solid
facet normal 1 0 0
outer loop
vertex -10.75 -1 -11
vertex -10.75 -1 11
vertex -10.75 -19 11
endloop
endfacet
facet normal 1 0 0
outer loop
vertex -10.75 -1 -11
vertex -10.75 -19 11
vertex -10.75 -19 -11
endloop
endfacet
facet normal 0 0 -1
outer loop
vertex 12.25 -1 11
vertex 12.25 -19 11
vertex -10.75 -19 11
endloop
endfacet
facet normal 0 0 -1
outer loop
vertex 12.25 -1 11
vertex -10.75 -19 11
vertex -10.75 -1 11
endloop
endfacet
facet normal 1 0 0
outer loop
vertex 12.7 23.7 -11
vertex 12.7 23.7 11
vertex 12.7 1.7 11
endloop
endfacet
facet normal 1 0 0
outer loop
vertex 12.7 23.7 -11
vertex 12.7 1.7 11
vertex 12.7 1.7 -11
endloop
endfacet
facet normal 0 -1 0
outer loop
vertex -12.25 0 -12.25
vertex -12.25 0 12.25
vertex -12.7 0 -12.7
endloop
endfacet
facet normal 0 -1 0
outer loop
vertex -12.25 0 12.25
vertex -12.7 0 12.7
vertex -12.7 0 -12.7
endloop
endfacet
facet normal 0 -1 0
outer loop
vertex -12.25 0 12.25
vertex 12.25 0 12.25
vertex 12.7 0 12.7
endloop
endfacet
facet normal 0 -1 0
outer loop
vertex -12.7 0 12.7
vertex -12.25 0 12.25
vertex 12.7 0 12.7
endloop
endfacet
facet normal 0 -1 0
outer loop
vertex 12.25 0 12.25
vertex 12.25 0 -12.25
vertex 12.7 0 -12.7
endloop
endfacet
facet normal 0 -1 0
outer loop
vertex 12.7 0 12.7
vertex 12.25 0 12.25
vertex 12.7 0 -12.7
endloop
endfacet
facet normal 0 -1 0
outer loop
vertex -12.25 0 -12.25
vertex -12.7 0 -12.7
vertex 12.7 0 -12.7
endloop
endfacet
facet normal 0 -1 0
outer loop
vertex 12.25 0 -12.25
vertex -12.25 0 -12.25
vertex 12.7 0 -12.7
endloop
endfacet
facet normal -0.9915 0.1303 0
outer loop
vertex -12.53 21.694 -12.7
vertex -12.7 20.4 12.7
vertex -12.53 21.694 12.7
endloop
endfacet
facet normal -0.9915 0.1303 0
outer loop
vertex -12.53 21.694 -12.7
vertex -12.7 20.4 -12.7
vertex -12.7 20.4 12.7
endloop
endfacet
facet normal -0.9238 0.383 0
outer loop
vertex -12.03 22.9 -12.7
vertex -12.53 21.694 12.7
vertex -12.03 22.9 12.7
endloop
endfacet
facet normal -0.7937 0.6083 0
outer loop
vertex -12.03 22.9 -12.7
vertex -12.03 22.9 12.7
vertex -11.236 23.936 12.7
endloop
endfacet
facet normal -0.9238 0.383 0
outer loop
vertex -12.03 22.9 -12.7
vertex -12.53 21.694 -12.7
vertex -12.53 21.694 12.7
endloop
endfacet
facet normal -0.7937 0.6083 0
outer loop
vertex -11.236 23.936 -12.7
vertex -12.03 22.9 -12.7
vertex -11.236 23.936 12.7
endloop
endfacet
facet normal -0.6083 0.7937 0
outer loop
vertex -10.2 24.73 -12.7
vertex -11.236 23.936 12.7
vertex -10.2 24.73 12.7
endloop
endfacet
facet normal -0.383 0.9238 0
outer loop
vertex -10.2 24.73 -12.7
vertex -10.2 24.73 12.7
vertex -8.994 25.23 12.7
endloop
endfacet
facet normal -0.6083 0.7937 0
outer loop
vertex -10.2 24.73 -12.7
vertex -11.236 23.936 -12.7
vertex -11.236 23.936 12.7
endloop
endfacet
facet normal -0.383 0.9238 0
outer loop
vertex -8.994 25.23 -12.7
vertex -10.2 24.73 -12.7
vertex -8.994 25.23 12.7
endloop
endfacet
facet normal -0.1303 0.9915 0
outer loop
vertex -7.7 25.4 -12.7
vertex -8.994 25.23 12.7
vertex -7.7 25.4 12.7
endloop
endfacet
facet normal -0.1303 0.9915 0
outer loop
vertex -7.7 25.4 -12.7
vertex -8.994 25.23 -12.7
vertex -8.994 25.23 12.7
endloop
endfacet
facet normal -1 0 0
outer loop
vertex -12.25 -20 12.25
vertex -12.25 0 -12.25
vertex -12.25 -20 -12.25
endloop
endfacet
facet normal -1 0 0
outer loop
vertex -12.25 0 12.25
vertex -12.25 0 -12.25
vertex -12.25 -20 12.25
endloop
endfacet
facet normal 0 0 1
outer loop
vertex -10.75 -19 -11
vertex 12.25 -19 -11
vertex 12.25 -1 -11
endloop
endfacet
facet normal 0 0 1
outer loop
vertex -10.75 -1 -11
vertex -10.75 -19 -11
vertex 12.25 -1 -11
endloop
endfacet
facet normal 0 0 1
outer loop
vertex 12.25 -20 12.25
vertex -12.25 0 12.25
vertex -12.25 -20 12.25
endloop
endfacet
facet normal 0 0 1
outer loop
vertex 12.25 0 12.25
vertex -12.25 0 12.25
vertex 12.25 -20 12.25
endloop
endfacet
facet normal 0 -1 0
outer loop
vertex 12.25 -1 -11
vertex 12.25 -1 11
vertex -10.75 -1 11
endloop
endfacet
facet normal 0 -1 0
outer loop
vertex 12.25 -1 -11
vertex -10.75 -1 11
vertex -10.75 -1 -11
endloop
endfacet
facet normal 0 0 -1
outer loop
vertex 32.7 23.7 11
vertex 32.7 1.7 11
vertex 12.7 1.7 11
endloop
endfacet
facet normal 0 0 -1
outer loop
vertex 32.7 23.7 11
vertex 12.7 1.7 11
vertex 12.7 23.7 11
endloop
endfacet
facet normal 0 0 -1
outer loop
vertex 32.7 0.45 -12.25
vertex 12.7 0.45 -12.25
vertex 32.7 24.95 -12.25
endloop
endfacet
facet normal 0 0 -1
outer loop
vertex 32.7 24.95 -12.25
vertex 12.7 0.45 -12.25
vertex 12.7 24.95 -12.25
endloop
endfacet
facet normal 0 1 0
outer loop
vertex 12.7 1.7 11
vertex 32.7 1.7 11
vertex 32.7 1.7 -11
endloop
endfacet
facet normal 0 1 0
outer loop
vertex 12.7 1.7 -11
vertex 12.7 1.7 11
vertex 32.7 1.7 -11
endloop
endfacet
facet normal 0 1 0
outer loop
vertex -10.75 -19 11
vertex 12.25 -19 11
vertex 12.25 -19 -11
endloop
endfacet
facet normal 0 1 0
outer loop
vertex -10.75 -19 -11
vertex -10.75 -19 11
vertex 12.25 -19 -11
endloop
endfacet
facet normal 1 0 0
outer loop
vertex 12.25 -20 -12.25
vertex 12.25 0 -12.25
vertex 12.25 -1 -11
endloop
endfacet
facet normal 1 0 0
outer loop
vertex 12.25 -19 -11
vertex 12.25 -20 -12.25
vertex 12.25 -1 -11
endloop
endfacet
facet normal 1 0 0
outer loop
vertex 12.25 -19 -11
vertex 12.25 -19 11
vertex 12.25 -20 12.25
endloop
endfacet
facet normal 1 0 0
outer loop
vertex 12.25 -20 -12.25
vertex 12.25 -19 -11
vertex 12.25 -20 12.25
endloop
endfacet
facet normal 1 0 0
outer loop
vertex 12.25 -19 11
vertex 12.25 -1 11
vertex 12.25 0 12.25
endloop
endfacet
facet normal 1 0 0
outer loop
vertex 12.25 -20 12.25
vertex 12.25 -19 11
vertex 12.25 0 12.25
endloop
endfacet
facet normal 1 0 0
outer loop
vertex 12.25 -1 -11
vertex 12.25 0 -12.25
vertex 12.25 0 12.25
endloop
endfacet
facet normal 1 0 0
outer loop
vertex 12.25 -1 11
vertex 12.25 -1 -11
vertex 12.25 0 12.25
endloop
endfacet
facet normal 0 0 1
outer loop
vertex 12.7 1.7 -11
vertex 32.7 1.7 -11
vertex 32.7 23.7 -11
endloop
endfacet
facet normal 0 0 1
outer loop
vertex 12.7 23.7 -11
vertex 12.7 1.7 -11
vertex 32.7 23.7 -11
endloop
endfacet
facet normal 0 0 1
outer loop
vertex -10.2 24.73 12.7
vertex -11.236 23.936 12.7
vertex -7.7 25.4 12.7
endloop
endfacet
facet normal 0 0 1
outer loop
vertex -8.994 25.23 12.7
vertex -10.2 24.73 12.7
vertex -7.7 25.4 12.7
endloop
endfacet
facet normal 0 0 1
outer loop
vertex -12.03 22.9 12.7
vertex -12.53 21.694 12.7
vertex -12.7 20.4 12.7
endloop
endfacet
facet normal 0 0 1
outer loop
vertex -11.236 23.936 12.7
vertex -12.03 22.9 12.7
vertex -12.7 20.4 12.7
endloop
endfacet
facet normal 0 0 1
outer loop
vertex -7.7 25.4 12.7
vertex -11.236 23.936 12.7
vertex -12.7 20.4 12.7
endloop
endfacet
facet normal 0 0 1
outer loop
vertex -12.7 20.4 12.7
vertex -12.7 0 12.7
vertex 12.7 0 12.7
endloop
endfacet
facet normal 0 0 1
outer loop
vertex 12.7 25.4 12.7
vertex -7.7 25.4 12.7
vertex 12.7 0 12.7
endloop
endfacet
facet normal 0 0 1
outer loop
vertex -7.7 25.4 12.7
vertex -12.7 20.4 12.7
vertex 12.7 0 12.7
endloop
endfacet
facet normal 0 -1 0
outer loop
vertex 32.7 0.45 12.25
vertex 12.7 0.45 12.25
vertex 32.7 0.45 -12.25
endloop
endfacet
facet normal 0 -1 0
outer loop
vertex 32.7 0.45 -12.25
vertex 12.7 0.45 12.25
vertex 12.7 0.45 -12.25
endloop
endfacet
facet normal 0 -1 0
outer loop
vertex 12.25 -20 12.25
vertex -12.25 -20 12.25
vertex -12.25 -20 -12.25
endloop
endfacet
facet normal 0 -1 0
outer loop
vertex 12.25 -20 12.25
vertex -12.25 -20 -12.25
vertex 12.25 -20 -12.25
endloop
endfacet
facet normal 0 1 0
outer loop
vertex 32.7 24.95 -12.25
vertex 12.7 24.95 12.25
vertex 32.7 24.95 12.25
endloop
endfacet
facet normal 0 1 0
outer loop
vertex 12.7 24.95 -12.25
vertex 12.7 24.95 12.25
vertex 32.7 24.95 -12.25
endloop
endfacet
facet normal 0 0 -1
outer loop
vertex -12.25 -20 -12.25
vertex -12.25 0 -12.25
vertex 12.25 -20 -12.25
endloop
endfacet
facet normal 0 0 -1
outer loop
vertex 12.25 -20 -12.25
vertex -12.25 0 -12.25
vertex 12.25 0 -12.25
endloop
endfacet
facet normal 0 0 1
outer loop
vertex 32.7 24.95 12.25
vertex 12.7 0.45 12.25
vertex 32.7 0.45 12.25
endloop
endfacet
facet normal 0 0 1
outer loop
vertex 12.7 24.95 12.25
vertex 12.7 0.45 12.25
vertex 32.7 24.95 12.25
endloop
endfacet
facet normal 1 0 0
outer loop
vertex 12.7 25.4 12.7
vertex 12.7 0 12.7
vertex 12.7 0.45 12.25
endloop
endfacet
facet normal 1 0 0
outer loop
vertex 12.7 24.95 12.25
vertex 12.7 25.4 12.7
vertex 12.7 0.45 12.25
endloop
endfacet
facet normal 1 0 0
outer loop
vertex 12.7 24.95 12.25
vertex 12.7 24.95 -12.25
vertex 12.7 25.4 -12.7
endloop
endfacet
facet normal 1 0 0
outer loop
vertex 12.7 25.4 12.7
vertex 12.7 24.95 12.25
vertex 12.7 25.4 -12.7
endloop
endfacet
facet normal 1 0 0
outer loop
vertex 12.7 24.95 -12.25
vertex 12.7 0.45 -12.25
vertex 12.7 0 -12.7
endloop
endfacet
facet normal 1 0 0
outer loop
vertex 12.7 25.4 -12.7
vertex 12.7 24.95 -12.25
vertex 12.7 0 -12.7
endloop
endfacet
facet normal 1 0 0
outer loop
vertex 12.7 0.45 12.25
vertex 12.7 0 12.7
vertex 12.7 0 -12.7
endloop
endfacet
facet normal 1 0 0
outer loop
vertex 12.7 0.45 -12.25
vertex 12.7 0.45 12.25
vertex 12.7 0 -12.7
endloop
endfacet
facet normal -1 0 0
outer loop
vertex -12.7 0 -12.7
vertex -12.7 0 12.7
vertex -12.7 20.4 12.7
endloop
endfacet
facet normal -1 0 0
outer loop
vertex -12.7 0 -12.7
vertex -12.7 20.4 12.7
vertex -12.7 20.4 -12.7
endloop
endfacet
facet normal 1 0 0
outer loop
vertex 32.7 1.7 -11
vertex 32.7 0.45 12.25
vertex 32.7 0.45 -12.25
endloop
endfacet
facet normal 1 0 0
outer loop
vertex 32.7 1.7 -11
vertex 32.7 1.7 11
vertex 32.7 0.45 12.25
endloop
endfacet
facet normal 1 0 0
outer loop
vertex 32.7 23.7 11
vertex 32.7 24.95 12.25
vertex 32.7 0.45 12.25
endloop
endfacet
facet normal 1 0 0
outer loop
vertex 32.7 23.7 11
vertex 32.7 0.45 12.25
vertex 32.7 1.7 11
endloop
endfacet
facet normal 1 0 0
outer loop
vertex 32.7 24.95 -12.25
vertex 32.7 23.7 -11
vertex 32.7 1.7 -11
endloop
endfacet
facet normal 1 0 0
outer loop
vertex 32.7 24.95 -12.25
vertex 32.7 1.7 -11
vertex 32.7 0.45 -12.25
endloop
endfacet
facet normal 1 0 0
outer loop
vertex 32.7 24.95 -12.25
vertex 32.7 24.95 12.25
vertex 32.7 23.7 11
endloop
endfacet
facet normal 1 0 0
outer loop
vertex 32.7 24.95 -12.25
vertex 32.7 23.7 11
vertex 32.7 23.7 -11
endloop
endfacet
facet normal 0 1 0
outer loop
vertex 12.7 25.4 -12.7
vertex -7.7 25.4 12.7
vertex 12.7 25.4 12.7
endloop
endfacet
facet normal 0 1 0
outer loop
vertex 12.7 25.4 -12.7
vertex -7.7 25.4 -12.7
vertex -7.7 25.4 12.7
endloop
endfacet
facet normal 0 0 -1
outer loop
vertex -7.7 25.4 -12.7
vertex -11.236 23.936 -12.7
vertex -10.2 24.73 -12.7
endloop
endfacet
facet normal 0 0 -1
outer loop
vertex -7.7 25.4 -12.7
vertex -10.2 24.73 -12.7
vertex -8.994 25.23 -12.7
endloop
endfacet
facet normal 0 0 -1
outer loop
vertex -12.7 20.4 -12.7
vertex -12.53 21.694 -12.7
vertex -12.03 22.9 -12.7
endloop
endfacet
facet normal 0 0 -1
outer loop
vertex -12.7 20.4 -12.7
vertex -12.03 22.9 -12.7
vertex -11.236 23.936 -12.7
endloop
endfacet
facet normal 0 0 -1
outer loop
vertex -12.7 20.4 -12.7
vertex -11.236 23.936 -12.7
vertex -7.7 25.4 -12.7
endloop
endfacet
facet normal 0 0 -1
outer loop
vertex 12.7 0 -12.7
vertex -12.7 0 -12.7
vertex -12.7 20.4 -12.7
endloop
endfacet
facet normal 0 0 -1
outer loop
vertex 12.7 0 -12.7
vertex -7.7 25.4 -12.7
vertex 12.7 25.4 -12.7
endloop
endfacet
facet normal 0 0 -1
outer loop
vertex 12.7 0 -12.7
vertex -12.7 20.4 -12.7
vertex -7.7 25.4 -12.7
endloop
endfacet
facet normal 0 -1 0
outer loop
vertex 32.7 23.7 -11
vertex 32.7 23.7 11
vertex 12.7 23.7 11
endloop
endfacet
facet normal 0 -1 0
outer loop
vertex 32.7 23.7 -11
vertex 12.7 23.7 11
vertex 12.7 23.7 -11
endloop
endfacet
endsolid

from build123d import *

# Parameters (mm, degrees)
SKETCH1_W           = 25.4
SKETCH1_H           = 25.4
BOSS_EXTRUDE1_DEPTH = 25.4
FILLET1_R           = 5
SKETCH2_W           = 24.5
SKETCH2_H           = 24.5
BOSS_EXTRUDE2_DEPTH = 20
SKETCH3_W           = 22
SKETCH3_H           = 22
CUT_EXTRUDE1_DEPTH  = 20
SKETCH4_W           = 24.5
SKETCH4_H           = 24.5
BOSS_EXTRUDE3_DEPTH = 20
SKETCH5_W           = 22
SKETCH5_H           = 18
CUT_EXTRUDE2_DEPTH  = 23


with BuildPart() as part:
    # Sketch1 → Boss-Extrude1 (new body)
    with BuildSketch(Plane(origin=(0, 0, 0), x_dir=(1, 0, 0), z_dir=(0, 1, 0))):
        Rectangle(SKETCH1_W, SKETCH1_H)
    extrude(amount=BOSS_EXTRUDE1_DEPTH)

    # Fillet1
    fillet1_edges = [part.edges().sort_by_distance(p)[0] for p in [
        (-12.7, 25.4, 0),
    ]]
    fillet(fillet1_edges, radius=FILLET1_R)

    # Sketch2 → Boss-Extrude2 (add)
    with BuildSketch(Plane(origin=(12.7, 0, 0), x_dir=(0, 0, -1), z_dir=(1, 0, 0))):
        with Locations((0, 12.7)):
            Rectangle(SKETCH2_W, SKETCH2_H)
    extrude(amount=BOSS_EXTRUDE2_DEPTH)

    # Sketch3 → Cut-Extrude1 (cut)
    with BuildSketch(Plane(origin=(32.7, 0, 0), x_dir=(0, 0, -1), z_dir=(1, 0, 0))):
        with Locations((0, 12.7)):
            Rectangle(SKETCH3_W, SKETCH3_H)
    extrude(amount=-CUT_EXTRUDE1_DEPTH, mode=Mode.SUBTRACT)

    # Sketch4 → Boss-Extrude3 (add)
    with BuildSketch(Plane.XZ):
        Rectangle(SKETCH4_W, SKETCH4_H)
    extrude(amount=BOSS_EXTRUDE3_DEPTH)

    # Sketch5 → Cut-Extrude2 (cut)
    with BuildSketch(Plane(origin=(12.25, 0, 0), x_dir=(0, 0, -1), z_dir=(1, 0, 0))):
        with Locations((0, -10)):
            Rectangle(SKETCH5_W, SKETCH5_H)
    extrude(amount=-CUT_EXTRUDE2_DEPTH, mode=Mode.SUBTRACT)


solid = part.part
